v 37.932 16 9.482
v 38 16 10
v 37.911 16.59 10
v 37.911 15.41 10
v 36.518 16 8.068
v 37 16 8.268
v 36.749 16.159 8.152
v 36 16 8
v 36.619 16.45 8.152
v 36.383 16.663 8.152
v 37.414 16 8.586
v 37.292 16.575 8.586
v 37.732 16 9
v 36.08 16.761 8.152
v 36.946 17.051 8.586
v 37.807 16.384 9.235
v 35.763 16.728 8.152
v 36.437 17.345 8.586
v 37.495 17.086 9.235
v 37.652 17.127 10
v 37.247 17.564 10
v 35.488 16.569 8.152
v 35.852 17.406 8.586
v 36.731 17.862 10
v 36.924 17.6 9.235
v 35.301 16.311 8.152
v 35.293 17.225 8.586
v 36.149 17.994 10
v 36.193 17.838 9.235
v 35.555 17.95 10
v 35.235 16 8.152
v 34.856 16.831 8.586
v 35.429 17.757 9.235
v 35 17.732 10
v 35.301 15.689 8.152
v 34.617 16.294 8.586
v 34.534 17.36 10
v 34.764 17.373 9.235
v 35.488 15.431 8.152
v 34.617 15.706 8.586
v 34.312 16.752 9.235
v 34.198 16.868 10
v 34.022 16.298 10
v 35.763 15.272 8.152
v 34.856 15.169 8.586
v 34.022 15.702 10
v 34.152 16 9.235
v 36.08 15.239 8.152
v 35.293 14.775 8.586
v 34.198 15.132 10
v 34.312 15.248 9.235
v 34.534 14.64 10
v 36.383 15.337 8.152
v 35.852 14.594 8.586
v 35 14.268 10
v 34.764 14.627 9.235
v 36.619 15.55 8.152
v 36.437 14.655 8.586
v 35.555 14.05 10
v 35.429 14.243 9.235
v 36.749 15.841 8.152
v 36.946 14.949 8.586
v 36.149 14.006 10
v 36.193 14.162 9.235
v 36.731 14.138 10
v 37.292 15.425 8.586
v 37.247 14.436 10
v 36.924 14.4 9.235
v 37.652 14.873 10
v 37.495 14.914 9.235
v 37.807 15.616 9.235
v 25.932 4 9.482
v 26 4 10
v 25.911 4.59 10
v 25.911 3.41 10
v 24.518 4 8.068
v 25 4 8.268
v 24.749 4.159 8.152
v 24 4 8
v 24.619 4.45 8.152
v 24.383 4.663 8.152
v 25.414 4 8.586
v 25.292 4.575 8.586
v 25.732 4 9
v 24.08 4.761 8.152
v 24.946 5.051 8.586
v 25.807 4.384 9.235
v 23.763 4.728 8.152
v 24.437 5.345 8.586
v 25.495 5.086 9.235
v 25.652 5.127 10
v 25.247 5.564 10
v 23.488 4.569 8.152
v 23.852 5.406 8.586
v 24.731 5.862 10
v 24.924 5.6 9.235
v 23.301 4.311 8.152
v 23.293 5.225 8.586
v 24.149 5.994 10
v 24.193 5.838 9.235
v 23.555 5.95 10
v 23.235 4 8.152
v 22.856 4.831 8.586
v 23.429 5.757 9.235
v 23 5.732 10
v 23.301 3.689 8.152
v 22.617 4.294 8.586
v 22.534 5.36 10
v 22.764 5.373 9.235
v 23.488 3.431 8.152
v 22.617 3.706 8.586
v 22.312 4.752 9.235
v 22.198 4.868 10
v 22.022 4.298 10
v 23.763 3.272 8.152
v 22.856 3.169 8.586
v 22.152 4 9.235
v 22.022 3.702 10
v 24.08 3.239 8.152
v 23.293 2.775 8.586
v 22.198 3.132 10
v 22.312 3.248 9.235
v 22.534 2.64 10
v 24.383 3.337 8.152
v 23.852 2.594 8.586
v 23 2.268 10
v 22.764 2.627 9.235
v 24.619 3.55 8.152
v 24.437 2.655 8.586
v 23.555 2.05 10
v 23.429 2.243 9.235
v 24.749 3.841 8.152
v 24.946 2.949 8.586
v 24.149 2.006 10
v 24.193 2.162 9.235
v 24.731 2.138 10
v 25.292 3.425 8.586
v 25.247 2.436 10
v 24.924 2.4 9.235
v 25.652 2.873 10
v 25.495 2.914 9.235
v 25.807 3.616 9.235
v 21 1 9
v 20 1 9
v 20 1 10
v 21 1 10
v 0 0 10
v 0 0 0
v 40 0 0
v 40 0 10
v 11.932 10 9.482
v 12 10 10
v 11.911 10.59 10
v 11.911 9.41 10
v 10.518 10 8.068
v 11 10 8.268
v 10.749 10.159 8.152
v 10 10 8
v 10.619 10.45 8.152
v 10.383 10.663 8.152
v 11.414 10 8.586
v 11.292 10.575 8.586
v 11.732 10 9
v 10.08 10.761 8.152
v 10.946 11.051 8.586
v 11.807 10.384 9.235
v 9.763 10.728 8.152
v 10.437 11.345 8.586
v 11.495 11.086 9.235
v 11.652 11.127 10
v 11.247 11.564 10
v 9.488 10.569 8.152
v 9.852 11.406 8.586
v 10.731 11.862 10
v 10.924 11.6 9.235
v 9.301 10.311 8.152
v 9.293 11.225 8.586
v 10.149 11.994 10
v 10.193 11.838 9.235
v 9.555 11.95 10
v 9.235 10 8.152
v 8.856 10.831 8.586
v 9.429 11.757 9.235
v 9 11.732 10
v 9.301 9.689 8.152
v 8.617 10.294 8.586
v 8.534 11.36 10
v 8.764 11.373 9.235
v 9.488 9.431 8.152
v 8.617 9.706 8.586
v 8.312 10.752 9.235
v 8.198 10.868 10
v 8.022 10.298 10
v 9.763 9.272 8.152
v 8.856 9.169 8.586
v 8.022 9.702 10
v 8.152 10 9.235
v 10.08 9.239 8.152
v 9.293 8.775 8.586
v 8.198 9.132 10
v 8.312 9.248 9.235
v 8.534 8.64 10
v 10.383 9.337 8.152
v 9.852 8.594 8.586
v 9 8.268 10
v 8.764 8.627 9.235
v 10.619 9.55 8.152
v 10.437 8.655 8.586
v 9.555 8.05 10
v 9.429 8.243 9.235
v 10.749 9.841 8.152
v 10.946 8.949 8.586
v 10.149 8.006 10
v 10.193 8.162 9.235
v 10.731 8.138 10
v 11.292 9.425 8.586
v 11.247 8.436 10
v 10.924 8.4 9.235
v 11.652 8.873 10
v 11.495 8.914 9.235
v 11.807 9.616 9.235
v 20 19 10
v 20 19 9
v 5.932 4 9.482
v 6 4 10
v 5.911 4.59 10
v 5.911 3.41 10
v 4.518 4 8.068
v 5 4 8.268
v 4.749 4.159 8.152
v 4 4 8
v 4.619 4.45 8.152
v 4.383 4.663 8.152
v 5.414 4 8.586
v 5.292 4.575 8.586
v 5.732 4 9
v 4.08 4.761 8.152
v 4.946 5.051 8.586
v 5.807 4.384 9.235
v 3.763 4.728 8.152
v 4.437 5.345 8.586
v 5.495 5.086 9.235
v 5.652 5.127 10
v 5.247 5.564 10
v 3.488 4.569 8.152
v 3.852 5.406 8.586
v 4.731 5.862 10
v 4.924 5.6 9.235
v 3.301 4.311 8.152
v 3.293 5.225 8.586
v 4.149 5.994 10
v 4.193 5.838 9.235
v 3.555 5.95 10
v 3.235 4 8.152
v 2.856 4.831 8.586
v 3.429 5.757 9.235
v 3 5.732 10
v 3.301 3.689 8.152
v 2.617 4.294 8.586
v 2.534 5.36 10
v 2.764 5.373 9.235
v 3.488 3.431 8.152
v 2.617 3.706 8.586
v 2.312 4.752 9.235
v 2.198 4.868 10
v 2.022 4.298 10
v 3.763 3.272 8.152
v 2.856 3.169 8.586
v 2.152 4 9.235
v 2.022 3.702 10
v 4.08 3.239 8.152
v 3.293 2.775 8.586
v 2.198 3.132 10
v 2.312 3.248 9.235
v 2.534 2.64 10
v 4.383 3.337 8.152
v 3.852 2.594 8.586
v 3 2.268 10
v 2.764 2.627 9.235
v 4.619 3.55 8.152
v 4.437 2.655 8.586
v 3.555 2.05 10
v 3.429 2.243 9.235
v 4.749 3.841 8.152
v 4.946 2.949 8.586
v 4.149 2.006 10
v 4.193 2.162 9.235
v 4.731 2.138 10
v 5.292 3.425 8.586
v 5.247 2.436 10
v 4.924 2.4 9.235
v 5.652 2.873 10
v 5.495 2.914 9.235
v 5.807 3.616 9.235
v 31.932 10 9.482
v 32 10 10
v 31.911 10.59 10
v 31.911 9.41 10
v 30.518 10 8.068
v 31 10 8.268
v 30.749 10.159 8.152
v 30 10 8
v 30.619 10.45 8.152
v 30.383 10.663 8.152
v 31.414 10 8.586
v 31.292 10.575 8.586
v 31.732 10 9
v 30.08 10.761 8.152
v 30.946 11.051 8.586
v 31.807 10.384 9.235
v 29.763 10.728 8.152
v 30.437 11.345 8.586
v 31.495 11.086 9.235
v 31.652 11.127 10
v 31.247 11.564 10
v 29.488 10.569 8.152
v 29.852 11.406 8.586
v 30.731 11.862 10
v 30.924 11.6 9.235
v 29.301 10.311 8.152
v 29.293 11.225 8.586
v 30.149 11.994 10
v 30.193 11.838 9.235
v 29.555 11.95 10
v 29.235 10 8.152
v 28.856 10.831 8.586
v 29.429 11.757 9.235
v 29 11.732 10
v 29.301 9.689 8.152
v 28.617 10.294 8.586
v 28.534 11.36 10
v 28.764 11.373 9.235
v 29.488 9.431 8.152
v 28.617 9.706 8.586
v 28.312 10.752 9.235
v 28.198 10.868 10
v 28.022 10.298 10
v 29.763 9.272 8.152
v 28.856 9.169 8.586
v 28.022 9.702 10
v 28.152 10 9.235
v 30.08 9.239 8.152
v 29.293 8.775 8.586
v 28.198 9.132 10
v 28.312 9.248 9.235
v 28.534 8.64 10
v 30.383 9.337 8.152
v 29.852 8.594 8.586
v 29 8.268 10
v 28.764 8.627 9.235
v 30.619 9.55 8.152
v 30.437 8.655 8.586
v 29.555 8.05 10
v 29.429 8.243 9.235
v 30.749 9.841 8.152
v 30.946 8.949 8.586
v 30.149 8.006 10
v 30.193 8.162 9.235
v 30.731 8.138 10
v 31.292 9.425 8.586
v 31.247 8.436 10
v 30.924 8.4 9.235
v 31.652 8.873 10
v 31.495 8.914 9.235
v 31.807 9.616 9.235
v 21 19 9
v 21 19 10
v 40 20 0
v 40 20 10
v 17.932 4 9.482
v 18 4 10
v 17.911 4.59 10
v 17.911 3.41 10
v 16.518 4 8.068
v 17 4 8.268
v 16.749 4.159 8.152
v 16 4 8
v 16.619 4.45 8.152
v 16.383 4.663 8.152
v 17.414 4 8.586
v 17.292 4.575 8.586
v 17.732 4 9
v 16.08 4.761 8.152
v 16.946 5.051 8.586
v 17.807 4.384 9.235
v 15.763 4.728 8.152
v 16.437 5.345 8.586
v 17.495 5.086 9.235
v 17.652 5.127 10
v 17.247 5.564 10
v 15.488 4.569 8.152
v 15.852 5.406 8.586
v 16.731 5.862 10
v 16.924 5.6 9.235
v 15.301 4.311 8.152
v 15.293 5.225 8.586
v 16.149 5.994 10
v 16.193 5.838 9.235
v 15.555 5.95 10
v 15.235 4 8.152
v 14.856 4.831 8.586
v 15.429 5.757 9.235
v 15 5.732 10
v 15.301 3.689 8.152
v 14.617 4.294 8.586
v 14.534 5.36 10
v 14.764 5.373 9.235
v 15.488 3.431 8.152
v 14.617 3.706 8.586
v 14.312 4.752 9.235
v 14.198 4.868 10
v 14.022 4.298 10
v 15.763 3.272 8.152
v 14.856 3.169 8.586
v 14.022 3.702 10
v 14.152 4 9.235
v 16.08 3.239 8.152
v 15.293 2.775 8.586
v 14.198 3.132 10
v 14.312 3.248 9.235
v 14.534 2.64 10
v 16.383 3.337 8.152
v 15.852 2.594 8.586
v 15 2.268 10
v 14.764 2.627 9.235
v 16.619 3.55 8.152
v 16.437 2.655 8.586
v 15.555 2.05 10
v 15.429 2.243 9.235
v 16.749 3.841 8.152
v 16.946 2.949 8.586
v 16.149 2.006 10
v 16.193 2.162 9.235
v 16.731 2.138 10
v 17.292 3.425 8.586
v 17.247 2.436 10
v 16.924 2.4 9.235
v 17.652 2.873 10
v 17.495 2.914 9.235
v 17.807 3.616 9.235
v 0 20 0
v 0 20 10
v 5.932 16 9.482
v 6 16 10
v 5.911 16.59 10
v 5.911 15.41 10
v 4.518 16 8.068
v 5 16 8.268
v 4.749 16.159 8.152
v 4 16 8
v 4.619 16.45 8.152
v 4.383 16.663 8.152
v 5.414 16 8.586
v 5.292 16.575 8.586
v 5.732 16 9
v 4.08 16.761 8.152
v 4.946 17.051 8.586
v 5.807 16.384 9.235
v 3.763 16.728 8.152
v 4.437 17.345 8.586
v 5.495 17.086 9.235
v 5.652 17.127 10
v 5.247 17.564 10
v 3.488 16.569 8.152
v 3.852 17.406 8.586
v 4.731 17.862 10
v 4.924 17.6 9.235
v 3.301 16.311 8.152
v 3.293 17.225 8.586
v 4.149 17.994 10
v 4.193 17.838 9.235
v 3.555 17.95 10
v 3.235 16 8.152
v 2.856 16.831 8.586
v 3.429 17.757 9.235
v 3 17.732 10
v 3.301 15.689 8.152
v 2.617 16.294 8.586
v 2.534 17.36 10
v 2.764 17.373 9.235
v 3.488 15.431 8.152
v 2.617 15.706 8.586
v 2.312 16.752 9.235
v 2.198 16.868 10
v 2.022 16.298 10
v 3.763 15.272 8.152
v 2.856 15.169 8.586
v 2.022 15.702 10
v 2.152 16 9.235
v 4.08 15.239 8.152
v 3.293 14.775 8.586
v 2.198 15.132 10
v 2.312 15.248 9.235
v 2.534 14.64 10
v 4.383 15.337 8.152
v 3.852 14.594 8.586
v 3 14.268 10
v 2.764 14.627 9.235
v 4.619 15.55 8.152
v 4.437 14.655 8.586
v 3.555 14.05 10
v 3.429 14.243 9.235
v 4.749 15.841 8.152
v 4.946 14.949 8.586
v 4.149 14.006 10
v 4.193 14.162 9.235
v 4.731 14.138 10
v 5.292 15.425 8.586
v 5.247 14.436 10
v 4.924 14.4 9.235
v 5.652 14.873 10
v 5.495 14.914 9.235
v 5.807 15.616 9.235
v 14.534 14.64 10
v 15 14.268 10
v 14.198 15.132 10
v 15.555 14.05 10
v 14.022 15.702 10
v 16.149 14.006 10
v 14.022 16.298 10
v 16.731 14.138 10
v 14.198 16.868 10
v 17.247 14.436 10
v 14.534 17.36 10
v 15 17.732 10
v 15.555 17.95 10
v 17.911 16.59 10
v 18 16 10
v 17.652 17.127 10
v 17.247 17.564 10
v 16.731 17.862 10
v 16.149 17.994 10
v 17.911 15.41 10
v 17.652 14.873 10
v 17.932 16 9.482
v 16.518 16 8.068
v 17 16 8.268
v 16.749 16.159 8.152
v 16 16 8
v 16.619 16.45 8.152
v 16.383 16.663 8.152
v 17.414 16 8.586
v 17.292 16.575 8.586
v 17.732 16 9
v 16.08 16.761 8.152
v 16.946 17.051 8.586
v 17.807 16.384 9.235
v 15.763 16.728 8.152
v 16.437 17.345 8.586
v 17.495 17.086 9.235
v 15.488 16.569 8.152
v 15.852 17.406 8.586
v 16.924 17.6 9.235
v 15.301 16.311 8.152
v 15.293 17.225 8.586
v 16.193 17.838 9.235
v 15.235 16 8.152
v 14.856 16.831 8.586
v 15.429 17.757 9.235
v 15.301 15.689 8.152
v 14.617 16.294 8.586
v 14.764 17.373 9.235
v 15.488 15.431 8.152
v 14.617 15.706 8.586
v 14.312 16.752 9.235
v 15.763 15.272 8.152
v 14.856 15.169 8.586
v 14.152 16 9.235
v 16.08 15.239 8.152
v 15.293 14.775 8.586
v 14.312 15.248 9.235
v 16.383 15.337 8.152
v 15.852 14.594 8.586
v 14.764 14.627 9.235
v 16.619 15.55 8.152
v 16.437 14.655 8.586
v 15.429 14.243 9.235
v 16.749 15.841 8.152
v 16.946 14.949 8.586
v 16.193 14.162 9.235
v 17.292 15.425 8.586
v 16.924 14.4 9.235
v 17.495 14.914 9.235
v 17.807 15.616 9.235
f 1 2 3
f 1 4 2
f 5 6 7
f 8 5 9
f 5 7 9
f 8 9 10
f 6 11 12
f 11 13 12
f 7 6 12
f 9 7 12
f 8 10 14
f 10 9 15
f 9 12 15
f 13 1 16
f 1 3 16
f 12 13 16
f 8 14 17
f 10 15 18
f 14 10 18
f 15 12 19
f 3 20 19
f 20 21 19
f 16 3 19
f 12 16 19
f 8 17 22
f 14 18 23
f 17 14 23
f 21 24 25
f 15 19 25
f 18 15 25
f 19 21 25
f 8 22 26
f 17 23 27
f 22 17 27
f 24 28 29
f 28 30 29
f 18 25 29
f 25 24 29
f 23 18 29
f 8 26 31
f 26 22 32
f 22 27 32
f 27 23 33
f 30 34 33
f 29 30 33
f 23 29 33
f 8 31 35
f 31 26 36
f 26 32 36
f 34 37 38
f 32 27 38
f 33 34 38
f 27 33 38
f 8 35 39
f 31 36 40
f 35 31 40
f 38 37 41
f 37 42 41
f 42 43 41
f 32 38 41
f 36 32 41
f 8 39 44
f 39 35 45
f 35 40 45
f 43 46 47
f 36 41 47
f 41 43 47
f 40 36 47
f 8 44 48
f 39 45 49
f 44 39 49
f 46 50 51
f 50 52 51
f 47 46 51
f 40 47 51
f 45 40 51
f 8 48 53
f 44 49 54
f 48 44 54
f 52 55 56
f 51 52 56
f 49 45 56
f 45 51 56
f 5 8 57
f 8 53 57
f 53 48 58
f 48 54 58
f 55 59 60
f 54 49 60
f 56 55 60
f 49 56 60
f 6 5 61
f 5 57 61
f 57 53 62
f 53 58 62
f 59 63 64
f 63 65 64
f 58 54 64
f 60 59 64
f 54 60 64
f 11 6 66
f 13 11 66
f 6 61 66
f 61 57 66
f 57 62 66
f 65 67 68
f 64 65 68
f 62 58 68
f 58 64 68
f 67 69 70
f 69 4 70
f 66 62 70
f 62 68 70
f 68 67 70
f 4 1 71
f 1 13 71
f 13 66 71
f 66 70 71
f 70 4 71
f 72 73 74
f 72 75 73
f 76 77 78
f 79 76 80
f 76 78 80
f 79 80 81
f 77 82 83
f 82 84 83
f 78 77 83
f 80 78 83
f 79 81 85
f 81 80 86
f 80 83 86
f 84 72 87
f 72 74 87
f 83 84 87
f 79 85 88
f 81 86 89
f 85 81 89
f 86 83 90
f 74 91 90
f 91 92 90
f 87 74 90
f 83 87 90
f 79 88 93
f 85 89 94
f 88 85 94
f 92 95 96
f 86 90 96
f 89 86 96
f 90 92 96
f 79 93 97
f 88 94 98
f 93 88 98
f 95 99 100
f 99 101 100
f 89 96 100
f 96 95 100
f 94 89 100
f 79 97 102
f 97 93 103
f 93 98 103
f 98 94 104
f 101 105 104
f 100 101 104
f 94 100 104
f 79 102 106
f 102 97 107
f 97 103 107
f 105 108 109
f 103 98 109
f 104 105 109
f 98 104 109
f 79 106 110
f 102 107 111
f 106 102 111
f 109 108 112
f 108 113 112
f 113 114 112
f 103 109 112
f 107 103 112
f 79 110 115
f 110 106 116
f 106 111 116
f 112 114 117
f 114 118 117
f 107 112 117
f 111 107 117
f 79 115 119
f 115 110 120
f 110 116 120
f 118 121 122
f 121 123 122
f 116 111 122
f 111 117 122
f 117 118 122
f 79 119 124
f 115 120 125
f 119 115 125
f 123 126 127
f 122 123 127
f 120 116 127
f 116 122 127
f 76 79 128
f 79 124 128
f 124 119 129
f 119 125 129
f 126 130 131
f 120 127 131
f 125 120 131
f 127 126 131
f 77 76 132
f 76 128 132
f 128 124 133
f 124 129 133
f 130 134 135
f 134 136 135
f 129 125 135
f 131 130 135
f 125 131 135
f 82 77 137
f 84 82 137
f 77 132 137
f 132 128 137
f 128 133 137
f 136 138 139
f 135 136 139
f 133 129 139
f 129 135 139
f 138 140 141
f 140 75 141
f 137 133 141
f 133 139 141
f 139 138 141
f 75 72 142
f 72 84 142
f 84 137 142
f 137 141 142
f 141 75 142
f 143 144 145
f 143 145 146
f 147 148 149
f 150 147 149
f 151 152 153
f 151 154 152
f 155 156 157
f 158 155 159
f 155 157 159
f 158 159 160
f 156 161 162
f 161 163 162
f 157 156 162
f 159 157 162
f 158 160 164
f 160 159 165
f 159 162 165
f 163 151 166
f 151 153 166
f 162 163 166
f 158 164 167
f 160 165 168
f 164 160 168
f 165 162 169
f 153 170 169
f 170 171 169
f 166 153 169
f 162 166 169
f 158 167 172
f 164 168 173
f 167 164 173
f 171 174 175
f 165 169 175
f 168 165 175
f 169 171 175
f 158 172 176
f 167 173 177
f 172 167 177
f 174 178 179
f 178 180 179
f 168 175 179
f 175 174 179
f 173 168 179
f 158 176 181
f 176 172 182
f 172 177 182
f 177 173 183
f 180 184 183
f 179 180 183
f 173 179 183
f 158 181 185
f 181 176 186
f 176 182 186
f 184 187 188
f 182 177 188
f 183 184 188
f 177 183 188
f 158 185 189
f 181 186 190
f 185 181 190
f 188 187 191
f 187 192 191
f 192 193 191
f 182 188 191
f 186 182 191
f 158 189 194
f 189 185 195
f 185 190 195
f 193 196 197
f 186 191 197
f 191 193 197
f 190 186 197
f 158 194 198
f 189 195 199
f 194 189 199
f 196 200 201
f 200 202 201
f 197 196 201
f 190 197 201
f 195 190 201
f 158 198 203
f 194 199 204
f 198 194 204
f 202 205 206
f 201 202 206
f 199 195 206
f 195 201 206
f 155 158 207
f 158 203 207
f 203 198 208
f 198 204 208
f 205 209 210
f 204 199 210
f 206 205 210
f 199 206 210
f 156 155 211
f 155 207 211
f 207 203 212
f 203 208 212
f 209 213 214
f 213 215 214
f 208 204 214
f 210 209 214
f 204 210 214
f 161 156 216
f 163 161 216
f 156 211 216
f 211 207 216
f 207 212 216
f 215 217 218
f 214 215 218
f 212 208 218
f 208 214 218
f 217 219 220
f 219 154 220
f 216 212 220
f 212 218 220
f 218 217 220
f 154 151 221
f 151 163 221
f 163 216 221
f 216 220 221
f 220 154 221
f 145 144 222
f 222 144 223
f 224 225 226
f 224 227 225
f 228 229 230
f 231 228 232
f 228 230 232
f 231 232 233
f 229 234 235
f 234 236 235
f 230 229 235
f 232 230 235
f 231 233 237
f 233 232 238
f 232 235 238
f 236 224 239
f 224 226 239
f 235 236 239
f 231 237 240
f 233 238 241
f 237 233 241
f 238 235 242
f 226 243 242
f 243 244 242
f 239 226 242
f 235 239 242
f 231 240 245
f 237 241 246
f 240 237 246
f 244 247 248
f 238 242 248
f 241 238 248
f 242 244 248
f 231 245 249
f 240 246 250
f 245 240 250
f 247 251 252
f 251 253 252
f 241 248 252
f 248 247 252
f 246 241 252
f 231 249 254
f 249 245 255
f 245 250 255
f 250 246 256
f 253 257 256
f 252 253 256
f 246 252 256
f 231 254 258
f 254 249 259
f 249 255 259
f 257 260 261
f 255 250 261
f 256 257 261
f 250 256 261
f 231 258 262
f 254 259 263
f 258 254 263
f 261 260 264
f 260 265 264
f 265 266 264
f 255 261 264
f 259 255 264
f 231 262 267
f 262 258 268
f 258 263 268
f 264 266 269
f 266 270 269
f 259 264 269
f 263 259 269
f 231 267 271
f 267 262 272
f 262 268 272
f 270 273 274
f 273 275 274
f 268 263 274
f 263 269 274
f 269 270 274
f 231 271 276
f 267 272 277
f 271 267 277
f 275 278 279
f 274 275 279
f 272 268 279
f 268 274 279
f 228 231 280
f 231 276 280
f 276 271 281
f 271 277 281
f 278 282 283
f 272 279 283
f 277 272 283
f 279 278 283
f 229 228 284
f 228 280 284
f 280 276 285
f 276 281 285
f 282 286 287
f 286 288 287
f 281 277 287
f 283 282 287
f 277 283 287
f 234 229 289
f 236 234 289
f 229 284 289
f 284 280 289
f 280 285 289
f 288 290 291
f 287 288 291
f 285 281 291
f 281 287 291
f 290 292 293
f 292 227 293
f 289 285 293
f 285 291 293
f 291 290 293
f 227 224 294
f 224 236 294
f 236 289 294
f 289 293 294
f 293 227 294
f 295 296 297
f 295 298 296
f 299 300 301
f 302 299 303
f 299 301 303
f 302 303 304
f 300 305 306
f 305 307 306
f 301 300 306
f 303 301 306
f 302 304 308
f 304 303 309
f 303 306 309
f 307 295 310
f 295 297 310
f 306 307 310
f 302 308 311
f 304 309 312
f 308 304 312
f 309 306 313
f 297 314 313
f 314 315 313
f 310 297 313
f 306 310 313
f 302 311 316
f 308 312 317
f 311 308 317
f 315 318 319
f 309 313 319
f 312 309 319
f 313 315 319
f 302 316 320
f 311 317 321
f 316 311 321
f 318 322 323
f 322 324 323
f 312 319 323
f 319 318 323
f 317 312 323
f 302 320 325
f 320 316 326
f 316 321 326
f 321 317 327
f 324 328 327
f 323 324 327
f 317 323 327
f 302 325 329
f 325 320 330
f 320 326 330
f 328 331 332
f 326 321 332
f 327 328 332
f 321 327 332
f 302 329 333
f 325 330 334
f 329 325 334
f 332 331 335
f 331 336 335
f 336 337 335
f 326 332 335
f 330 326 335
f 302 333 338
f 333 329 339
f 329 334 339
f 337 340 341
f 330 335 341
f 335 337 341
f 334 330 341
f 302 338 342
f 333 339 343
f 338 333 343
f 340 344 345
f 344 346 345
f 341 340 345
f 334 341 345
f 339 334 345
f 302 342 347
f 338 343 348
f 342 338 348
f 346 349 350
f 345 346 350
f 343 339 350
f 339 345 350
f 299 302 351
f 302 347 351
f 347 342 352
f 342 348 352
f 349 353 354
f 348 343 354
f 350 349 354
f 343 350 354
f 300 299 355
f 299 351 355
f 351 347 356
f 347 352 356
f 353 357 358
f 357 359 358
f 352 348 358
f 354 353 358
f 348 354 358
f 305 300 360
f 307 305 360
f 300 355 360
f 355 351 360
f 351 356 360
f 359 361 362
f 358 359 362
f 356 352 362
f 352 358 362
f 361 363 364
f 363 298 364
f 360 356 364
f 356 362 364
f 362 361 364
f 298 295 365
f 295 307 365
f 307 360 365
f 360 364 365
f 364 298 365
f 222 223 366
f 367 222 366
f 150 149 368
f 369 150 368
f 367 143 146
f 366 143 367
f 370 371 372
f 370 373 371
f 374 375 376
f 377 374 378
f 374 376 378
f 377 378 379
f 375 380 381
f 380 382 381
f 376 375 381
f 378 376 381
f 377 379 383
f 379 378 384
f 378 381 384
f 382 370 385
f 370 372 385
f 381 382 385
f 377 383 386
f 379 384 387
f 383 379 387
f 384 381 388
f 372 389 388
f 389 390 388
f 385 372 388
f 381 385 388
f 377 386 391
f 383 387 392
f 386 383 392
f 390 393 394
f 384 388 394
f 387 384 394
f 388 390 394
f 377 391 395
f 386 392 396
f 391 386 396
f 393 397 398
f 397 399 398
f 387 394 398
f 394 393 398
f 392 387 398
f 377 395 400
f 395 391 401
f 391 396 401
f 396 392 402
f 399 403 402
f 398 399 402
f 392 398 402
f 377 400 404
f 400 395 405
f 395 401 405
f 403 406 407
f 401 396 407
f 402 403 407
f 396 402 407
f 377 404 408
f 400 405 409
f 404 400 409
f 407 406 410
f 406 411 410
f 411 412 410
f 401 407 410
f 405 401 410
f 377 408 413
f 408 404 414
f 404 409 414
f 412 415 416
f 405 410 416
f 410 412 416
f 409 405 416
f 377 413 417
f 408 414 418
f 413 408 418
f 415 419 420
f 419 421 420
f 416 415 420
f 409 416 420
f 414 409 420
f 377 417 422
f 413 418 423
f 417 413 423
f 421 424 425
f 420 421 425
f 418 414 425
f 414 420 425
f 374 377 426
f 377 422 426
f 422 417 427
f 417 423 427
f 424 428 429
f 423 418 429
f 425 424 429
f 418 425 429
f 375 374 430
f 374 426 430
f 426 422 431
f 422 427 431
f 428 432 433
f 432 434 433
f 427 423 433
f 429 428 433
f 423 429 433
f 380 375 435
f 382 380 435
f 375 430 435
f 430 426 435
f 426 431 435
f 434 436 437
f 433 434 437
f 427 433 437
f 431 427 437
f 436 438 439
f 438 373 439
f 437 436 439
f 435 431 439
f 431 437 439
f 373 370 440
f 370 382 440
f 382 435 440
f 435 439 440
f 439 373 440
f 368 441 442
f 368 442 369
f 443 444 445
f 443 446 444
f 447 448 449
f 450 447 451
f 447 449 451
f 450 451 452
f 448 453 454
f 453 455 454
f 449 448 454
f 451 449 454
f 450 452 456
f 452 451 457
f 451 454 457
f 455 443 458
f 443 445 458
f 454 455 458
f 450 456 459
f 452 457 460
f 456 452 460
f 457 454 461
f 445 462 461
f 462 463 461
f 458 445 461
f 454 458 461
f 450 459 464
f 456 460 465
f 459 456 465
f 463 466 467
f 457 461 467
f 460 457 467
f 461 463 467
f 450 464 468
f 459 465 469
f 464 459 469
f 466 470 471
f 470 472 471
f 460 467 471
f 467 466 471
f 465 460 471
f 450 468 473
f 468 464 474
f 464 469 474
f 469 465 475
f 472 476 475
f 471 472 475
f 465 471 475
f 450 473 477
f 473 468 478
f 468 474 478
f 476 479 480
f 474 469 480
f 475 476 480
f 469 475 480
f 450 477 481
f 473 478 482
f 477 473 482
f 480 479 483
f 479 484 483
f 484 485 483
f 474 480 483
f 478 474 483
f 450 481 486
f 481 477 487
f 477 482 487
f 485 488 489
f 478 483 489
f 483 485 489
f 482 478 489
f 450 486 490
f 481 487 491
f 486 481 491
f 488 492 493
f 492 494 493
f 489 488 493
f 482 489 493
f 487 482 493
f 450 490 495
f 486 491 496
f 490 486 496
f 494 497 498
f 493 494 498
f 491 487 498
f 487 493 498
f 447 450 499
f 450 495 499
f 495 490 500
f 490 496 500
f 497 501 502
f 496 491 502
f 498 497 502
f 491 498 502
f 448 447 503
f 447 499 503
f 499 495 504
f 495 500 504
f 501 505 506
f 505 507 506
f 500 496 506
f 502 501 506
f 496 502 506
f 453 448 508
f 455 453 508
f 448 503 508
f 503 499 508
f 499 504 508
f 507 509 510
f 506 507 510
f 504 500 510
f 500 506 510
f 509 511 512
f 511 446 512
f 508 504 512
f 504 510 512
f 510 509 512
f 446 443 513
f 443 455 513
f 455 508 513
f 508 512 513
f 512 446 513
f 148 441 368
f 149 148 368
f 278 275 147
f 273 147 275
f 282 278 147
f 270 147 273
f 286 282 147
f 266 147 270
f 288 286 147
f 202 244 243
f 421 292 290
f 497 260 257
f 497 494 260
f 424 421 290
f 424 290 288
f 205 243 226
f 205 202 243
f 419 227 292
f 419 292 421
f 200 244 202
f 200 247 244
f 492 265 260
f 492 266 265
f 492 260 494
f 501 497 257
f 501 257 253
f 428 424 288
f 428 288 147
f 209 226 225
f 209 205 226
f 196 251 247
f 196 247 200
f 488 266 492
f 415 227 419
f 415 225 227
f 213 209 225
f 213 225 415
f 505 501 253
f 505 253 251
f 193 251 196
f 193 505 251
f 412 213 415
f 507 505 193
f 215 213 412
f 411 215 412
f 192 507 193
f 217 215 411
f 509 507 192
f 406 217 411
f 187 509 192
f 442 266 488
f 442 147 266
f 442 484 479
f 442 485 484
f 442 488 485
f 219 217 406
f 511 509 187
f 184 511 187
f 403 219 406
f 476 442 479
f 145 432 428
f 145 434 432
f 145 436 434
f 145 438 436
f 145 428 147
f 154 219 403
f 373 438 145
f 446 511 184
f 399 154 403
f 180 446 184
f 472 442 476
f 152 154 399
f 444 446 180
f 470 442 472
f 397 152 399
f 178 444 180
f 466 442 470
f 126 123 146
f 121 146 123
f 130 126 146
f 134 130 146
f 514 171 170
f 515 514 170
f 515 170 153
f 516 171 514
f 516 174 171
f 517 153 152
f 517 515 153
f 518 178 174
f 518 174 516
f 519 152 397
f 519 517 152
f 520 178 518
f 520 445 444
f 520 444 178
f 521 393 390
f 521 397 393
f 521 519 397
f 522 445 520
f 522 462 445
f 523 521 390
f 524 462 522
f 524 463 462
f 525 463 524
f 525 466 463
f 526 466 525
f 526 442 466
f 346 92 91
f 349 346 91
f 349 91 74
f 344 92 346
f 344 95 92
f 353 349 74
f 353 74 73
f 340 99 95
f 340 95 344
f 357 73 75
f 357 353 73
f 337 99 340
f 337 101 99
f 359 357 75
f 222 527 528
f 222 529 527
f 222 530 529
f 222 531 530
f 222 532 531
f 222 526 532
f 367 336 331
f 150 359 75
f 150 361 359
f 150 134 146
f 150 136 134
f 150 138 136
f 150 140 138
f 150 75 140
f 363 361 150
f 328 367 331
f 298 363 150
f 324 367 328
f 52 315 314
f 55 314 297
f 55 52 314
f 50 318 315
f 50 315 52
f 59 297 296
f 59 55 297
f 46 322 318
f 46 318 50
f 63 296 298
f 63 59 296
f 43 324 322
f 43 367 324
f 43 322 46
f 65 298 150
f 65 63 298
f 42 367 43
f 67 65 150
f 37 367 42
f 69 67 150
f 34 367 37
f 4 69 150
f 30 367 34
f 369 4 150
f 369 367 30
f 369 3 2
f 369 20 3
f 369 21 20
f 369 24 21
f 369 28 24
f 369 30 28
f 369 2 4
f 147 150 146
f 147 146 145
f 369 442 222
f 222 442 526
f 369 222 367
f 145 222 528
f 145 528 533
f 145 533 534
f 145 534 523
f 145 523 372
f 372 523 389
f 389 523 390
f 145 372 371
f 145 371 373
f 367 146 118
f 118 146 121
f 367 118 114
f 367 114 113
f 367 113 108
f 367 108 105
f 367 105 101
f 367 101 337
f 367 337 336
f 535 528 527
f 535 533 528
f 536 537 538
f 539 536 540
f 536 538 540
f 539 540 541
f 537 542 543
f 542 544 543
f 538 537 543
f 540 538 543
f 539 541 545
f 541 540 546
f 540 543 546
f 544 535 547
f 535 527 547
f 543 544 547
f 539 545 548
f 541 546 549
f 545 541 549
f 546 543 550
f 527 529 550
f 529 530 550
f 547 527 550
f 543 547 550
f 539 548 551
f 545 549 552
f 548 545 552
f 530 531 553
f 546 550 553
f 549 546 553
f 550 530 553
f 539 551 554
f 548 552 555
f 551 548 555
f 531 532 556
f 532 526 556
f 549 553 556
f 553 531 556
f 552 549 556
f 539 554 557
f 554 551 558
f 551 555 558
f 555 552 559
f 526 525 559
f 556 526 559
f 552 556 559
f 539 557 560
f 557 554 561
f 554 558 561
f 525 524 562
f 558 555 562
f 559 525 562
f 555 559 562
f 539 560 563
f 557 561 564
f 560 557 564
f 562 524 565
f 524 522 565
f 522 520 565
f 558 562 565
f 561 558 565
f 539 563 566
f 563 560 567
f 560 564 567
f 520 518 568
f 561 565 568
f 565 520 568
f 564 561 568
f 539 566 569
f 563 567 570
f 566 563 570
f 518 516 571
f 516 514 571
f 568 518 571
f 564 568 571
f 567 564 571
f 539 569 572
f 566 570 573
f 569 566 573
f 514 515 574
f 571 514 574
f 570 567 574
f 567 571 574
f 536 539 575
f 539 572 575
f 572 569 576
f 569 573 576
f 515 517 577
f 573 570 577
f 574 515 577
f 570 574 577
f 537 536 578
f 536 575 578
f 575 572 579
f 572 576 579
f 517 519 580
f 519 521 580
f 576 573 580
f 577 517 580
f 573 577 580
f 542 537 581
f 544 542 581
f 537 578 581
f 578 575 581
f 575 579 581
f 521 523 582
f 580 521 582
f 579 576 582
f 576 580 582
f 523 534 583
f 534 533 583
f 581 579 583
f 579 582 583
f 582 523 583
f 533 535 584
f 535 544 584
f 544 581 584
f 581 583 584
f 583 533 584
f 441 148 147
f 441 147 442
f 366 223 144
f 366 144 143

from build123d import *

# Parameters (mm, degrees)
BOX001_W     = 1
BOX001_H     = 18
BOX001_DEPTH = 1
BOX_W        = 40
BOX_H        = 20
BOX_DEPTH    = 10


with BuildPart() as sphere002:
    # Sphere002 → Sphere002 (revolve)
    with BuildSketch(Plane(origin=(4, 4, 10), x_dir=(1, 0, 0), z_dir=(0, -1, 0))):
        with BuildLine():
            ThreePointArc((0, -2), (2, 0), (0, 2))
            Line((0, 2), (0, -2))
        make_face()
    revolve(axis=Axis((4, 4, 10), (0, 0, 1)))


with BuildPart() as fusion001:
    # Sphere003 → Sphere003 (revolve)
    with BuildSketch(Plane(origin=(4, 16, 10), x_dir=(1, 0, 0), z_dir=(0, -1, 0))):
        with BuildLine():
            ThreePointArc((0, -2), (2, 0), (0, 2))
            Line((0, 2), (0, -2))
        make_face()
    revolve(axis=Axis((4, 16, 10), (0, 0, 1)))

    # Fusion001: union Sphere002
    add(sphere002.part)


with BuildPart() as fusion001_1:
    # Fusion001 placement: moved
    add(fusion001.part.moved(Location((12, 0, 0))))


with BuildPart() as sphere004:
    # Sphere004 → Sphere004 (revolve)
    with BuildSketch(Plane(origin=(10, 10, 10), x_dir=(1, 0, 0), z_dir=(0, -1, 0))):
        with BuildLine():
            ThreePointArc((0, -2), (2, 0), (0, 2))
            Line((0, 2), (0, -2))
        make_face()
    revolve(axis=Axis((10, 10, 10), (0, 0, 1)))


with BuildPart() as sphere005:
    # Sphere005 → Sphere005 (revolve)
    with BuildSketch(Plane(origin=(24, 4, 10), x_dir=(1, 0, 0), z_dir=(0, -1, 0))):
        with BuildLine():
            ThreePointArc((0, -2), (2, 0), (0, 2))
            Line((0, 2), (0, -2))
        make_face()
    revolve(axis=Axis((24, 4, 10), (0, 0, 1)))


with BuildPart() as sphere007:
    # Sphere007 → Sphere007 (revolve)
    with BuildSketch(Plane(origin=(4, 16, 10), x_dir=(1, 0, 0), z_dir=(0, -1, 0))):
        with BuildLine():
            ThreePointArc((0, -2), (2, 0), (0, 2))
            Line((0, 2), (0, -2))
        make_face()
    revolve(axis=Axis((4, 16, 10), (0, 0, 1)))


with BuildPart() as sphere008:
    # Sphere008 → Sphere008 (revolve)
    with BuildSketch(Plane(origin=(36, 16, 10), x_dir=(1, 0, 0), z_dir=(0, -1, 0))):
        with BuildLine():
            ThreePointArc((0, -2), (2, 0), (0, 2))
            Line((0, 2), (0, -2))
        make_face()
    revolve(axis=Axis((36, 16, 10), (0, 0, 1)))


with BuildPart() as sphere009:
    # Sphere009 → Sphere009 (revolve)
    with BuildSketch(Plane(origin=(30, 10, 10), x_dir=(1, 0, 0), z_dir=(0, -1, 0))):
        with BuildLine():
            ThreePointArc((0, -2), (2, 0), (0, 2))
            Line((0, 2), (0, -2))
        make_face()
    revolve(axis=Axis((30, 10, 10), (0, 0, 1)))


with BuildPart() as sphere:
    # Sphere → Sphere (revolve)
    with BuildSketch(Plane(origin=(4, 4, 10), x_dir=(1, 0, 0), z_dir=(0, -1, 0))):
        with BuildLine():
            ThreePointArc((0, -2), (2, 0), (0, 2))
            Line((0, 2), (0, -2))
        make_face()
    revolve(axis=Axis((4, 4, 10), (0, 0, 1)))


with BuildPart() as fusion002:
    # Sphere001 → Sphere001 (revolve)
    with BuildSketch(Plane(origin=(4, 16, 10), x_dir=(1, 0, 0), z_dir=(0, -1, 0))):
        with BuildLine():
            ThreePointArc((0, -2), (2, 0), (0, 2))
            Line((0, 2), (0, -2))
        make_face()
    revolve(axis=Axis((4, 16, 10), (0, 0, 1)))

    # Fusion: union Sphere
    add(sphere.part)

    # Fusion002: union Fusion001, Sphere004, Sphere005, Sphere007, Sphere008, Sphere009
    add(fusion001_1.part)
    add(sphere004.part)
    add(sphere005.part)
    add(sphere007.part)
    add(sphere008.part)
    add(sphere009.part)


with BuildPart() as cube001:
    # Box001 → Box001 (new body)
    with BuildSketch(Plane(origin=(20, 1, 9), x_dir=(1, 0, 0), z_dir=(0, 0, 1))):
        with Locations((0.5, 9)):
            Rectangle(BOX001_W, BOX001_H)
    extrude(amount=BOX001_DEPTH)


with BuildPart() as cut001:
    # Box → Box (new body)
    with BuildSketch(Plane.XY):
        with Locations((20, 10)):
            Rectangle(BOX_W, BOX_H)
    extrude(amount=BOX_DEPTH)

    # Cut: cut Cube001
    add(cube001.part, mode=Mode.SUBTRACT)

    # Cut001: cut Fusion002
    add(fusion002.part, mode=Mode.SUBTRACT)


solid = cut001.part
